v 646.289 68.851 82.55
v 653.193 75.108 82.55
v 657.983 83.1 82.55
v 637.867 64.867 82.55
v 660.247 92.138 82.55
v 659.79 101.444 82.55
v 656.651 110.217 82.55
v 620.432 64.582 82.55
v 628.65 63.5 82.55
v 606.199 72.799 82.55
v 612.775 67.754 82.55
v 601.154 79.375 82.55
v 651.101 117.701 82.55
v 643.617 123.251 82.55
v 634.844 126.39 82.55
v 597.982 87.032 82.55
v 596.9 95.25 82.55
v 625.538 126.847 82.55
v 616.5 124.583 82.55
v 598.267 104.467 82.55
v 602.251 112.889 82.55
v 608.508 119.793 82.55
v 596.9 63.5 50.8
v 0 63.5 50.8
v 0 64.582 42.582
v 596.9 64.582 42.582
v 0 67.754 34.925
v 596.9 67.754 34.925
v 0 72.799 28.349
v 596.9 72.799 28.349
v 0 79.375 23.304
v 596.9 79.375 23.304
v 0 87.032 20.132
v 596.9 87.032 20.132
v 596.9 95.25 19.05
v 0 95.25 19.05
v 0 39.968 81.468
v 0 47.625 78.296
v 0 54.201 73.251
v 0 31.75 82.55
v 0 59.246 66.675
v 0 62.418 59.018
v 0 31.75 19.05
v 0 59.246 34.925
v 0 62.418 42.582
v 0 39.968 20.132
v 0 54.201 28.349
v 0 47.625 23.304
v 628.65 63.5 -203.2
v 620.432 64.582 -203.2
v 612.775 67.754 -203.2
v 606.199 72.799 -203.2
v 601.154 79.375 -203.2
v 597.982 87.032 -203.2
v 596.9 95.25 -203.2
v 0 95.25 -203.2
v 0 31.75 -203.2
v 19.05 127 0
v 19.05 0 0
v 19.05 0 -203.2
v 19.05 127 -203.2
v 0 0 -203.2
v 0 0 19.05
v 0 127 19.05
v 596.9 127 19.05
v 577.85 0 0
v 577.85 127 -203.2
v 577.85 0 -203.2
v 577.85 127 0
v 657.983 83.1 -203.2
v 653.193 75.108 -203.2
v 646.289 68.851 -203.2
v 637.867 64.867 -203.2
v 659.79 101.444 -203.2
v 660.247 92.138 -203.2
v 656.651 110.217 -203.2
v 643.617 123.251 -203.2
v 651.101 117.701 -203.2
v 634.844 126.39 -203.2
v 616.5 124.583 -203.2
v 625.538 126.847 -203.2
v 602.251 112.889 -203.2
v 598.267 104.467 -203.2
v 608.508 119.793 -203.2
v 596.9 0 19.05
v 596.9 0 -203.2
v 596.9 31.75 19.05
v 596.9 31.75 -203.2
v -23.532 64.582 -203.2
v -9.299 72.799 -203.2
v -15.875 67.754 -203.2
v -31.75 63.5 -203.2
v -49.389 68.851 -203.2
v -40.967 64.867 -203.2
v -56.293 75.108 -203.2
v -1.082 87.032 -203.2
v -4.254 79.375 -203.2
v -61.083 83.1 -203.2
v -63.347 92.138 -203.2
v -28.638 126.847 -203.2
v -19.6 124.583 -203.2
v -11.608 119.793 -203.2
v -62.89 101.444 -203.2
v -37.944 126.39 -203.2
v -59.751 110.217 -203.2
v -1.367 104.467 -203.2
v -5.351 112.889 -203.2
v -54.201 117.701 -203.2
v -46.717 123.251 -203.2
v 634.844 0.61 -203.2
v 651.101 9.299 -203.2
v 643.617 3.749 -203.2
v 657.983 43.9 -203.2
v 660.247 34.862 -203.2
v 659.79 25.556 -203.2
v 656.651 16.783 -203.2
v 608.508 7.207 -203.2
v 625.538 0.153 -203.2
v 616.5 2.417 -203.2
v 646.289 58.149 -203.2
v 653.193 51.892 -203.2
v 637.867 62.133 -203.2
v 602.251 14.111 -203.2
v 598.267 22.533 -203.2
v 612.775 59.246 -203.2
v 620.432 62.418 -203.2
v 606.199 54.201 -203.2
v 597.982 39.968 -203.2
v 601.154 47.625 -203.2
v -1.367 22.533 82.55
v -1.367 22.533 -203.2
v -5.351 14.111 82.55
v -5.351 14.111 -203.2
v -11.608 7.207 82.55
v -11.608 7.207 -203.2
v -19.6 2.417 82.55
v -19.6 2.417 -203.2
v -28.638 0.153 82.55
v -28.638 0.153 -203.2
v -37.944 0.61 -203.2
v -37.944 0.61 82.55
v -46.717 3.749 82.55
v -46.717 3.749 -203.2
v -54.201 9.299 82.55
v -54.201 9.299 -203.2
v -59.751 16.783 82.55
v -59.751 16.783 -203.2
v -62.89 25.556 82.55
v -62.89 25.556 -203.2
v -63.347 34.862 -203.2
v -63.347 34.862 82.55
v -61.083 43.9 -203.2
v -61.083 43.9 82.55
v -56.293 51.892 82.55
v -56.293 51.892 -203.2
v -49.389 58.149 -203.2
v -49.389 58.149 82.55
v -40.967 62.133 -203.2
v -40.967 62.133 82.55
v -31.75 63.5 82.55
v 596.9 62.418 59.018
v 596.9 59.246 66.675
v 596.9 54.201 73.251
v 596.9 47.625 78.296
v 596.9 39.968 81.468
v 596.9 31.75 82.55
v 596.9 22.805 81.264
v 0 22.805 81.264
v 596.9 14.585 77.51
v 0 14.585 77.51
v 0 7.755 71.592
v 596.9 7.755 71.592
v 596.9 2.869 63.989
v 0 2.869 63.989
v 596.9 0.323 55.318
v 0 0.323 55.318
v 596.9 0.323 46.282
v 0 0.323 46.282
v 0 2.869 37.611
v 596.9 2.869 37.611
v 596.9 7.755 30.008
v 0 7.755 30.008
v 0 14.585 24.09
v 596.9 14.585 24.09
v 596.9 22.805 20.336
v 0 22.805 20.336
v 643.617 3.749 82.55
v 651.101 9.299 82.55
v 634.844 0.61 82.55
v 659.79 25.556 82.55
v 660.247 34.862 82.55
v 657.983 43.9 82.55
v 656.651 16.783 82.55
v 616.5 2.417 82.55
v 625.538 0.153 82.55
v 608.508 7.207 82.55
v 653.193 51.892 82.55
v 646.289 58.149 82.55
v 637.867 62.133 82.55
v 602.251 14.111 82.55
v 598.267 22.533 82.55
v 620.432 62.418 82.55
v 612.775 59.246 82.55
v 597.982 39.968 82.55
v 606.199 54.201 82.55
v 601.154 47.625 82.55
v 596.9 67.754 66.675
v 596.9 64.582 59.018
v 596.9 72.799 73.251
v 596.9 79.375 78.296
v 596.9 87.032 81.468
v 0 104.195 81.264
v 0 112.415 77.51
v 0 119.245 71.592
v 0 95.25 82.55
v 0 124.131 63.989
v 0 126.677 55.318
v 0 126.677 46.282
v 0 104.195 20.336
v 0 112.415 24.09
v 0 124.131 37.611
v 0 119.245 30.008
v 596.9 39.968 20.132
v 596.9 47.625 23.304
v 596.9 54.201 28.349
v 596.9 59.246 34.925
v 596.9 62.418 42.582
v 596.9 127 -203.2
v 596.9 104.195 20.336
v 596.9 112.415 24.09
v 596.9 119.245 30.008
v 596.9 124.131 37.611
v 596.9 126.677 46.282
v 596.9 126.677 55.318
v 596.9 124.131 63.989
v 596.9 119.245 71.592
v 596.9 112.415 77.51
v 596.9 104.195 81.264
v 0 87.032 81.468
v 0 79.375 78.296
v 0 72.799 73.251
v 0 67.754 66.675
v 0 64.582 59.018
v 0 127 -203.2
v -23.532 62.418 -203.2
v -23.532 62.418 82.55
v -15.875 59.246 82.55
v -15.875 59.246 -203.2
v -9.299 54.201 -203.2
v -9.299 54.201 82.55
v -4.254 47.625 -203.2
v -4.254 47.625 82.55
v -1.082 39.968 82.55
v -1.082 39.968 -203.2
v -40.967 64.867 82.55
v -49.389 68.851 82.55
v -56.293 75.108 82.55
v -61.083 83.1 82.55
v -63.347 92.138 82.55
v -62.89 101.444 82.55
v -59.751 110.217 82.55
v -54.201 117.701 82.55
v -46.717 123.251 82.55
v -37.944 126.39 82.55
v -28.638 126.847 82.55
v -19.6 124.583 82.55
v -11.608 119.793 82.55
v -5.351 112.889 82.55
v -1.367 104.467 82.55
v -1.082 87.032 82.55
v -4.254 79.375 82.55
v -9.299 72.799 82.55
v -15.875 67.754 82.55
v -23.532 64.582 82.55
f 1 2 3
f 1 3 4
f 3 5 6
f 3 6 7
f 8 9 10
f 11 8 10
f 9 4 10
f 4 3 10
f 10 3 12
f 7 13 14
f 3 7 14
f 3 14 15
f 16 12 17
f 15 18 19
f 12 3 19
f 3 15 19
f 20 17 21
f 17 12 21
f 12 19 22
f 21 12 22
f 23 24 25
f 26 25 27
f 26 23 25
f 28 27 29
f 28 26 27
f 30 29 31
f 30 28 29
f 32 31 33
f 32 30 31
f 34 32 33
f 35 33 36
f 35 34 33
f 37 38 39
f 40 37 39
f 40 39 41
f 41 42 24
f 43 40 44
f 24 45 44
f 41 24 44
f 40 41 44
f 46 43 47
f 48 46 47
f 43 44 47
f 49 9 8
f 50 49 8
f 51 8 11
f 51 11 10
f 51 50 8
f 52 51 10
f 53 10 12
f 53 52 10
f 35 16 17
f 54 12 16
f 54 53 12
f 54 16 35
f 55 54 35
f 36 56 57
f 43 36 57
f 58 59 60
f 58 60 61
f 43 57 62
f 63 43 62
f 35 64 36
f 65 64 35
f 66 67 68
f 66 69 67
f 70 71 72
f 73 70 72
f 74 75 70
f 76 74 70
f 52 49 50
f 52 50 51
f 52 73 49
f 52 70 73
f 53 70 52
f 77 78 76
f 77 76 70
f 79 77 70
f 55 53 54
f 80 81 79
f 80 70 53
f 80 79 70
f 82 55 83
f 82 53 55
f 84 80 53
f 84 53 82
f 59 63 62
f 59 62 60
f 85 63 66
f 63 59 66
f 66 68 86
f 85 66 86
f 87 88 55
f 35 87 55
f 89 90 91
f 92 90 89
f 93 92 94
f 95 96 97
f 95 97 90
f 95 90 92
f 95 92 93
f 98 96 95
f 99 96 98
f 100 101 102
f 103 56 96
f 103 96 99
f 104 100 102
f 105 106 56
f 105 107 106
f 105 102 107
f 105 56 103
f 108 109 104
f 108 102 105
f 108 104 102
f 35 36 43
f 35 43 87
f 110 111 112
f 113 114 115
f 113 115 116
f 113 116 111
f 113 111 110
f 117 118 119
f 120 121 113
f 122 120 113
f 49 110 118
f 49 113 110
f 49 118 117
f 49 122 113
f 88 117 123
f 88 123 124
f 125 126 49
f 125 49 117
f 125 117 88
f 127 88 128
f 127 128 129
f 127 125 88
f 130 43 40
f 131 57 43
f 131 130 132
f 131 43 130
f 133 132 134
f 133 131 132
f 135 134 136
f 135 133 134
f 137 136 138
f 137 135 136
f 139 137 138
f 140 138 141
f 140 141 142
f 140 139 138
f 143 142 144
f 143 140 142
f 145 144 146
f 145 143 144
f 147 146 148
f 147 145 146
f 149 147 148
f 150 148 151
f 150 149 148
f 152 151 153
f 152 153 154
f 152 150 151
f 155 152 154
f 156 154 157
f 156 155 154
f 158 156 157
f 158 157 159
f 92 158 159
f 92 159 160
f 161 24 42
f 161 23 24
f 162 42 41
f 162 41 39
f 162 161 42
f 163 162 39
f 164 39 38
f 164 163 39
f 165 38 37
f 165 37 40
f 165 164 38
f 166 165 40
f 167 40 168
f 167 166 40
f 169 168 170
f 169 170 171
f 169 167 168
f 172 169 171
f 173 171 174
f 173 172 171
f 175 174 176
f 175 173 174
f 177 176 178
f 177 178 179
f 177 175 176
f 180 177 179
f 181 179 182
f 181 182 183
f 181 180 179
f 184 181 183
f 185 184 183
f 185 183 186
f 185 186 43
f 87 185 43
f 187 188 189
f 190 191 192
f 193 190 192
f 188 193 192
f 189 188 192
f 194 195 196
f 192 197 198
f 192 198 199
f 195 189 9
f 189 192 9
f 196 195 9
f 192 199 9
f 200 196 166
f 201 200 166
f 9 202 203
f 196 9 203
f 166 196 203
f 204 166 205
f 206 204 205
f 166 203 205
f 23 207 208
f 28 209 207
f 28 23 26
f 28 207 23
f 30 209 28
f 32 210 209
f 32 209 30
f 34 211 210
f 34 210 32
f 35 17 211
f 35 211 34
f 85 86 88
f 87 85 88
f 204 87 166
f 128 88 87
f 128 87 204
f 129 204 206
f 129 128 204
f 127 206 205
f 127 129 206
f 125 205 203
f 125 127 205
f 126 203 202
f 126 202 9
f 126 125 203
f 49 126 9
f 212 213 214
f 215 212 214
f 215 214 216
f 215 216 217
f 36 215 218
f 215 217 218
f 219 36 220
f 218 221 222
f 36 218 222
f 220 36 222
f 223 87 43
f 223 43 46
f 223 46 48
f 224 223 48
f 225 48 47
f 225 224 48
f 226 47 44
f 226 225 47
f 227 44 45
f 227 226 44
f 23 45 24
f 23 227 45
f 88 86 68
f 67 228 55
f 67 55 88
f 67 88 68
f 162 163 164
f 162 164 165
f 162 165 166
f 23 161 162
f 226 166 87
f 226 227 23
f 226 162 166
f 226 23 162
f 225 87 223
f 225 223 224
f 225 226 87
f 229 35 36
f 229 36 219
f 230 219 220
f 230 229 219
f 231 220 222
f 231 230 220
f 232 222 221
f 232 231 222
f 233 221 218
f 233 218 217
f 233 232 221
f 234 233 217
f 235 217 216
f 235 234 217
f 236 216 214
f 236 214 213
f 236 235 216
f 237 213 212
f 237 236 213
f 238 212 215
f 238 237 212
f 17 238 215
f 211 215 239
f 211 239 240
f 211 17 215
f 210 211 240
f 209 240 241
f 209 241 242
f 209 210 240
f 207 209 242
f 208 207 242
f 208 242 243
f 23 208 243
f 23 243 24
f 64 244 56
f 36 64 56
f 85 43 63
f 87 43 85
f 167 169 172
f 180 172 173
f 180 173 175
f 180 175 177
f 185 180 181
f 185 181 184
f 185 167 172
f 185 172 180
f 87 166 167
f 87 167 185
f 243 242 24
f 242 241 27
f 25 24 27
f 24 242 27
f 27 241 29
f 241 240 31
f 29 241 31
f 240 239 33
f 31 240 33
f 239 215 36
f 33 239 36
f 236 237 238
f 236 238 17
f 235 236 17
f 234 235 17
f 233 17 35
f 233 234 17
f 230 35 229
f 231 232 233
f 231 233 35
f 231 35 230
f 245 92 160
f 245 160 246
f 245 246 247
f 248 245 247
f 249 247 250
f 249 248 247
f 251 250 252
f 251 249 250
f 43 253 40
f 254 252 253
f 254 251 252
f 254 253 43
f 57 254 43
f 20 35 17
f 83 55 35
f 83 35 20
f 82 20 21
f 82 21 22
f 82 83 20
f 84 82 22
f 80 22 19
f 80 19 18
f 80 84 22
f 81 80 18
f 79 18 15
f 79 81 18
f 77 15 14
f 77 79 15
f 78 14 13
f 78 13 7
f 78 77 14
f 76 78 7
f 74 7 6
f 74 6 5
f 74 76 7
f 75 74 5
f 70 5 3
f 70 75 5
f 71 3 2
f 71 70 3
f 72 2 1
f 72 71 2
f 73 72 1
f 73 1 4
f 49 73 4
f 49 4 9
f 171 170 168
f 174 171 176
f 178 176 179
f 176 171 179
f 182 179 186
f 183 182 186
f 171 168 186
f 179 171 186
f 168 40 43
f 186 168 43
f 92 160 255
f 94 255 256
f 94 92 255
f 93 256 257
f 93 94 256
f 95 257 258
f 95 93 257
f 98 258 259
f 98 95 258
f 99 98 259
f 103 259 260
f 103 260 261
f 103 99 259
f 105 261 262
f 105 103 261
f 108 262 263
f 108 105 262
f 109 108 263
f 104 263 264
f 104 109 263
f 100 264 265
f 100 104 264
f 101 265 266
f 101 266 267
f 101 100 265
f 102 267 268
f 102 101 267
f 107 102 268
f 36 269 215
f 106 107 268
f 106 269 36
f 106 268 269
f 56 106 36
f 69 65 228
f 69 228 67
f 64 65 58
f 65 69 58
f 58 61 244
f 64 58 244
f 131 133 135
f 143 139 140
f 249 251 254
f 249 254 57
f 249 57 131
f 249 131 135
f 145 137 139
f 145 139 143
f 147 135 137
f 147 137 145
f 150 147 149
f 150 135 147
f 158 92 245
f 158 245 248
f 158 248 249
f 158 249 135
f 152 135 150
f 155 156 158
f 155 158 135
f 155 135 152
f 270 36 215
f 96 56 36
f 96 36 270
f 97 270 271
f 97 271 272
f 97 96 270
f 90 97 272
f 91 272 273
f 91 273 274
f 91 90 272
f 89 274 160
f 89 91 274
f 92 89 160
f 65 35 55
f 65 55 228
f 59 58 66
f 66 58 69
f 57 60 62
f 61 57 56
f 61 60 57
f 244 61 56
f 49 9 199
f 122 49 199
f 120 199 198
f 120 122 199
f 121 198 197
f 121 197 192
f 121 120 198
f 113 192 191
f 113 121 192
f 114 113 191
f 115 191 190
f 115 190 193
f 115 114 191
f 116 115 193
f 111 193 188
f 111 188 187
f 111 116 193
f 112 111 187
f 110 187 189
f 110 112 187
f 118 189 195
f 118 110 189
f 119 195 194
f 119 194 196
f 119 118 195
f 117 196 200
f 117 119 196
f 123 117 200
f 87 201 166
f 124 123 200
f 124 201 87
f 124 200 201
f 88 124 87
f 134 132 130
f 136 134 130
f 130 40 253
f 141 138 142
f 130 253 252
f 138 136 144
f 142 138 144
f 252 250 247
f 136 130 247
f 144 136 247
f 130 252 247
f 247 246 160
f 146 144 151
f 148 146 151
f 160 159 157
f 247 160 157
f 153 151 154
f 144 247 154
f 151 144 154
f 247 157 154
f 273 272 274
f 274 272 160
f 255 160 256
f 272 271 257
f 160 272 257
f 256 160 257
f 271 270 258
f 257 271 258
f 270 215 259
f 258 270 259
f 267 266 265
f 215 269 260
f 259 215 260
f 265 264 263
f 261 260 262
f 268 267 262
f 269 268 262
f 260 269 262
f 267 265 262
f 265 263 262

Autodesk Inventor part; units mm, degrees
ref_plane "YZ Plane" through (0, 0, 0) normal (1, 0, 0) x (0, 1, 0)
ref_plane "XZ Plane" through (0, 0, 0) normal (0, 1, 0) x (-1, 0, 0)
ref_plane "XY Plane" through (0, 0, 0) normal (0, 0, 1) x (1, 0, 0)
sketch "Sketch1" plane through (0, 0, 0) normal (0, 0, 1) x (1, 0, 0)
  line L0 (0, 0) -> (596.9, 0)
  line L1 (596.9, 0) -> (596.9, 127)
  line L2 (596.9, 127) -> (0, 127)
  line L3 (0, 127) -> (0, 0)
  dimension "d0" = 127
  dimension "d1" = 596.9
extrude "Extrusion1" add sketch "Sketch1" along normal blind 19.05
sketch "Sketch2" plane through (0, 0, 0) normal (0, 0, -1) x (-1, 0, 0)
  line L0 (0, 0) -> (-596.9, 0) projected
  line L1 (-596.9, 127) -> (0, 127) projected
  line L2 (-596.9, 0) -> (-596.9, 127) projected
  line L3 (-596.9, 127) -> (-577.85, 127)
  line L4 (-577.85, 127) -> (-577.85, 0)
  line L5 (-577.85, 0) -> (-596.9, 0)
  line L6 (-596.9, 0) -> (-596.9, 127)
  line L7 (0, 0) -> (-19.05, 0)
  line L8 (-19.05, 0) -> (-19.05, 127)
  line L9 (-19.05, 127) -> (0, 127)
  line L10 (0, 127) -> (0, 0)
  dimension "d4" = 19.05
  dimension "d5" = 19.05
extrude "Extrusion2" add sketch "Sketch2" along normal blind 203.2 contours L0 L8 L1 L10 | L0 L2 L1 L4
sketch "Sketch3" plane through (596.9, 0, 19.05) normal (1, 0, 0) x (0, 0, -1)
  line L0 (222.25, 127) -> (0, 127) projected
  line L1 (0, 0) -> (0, 127) projected
  circle A0 centre (-31.75, 95.25) radius 31.75
  circle A1 centre (-31.75, 31.75) radius 31.75
  point P0 (19.05, 0)
  dimension "d8" = 63.5
  dimension "d9" = 63.5
  dimension "d10" = 31.75
  dimension "d11" = 31.75
  dimension "d12" = 31.75
extrude "Extrusion3" add sketch "Sketch3" against normal blind 596.9 contours A1 | A0
sketch "Sketch4" plane through (0, 0, -203.2) normal (0, 0, -1) x (-1, 0, 0)
  line L0 (-577.85, 127) -> (-596.9, 127) projected
  circle A0 centre (-628.65, 95.25) radius 31.75
  circle A1 centre (-628.65, 31.75) radius 31.75
  circle A2 centre (31.75, 95.25) radius 31.75
  circle A3 centre (31.75, 31.75) radius 31.75
  line L1 (0, 0) -> (0, 127) projected
  line L2 (0, 127) -> (-19.05, 127) projected
  dimension "d15" = 63.5
  dimension "d16" = 63.5
  dimension "d17" = 660.4
  dimension "d18" = 31.75
  dimension "d19" = 31.75
extrude "Extrusion4" add sketch "Sketch4" against normal blind 285.75 contours A0 | A1 | A2 | A3
properties part number "Bumper"
